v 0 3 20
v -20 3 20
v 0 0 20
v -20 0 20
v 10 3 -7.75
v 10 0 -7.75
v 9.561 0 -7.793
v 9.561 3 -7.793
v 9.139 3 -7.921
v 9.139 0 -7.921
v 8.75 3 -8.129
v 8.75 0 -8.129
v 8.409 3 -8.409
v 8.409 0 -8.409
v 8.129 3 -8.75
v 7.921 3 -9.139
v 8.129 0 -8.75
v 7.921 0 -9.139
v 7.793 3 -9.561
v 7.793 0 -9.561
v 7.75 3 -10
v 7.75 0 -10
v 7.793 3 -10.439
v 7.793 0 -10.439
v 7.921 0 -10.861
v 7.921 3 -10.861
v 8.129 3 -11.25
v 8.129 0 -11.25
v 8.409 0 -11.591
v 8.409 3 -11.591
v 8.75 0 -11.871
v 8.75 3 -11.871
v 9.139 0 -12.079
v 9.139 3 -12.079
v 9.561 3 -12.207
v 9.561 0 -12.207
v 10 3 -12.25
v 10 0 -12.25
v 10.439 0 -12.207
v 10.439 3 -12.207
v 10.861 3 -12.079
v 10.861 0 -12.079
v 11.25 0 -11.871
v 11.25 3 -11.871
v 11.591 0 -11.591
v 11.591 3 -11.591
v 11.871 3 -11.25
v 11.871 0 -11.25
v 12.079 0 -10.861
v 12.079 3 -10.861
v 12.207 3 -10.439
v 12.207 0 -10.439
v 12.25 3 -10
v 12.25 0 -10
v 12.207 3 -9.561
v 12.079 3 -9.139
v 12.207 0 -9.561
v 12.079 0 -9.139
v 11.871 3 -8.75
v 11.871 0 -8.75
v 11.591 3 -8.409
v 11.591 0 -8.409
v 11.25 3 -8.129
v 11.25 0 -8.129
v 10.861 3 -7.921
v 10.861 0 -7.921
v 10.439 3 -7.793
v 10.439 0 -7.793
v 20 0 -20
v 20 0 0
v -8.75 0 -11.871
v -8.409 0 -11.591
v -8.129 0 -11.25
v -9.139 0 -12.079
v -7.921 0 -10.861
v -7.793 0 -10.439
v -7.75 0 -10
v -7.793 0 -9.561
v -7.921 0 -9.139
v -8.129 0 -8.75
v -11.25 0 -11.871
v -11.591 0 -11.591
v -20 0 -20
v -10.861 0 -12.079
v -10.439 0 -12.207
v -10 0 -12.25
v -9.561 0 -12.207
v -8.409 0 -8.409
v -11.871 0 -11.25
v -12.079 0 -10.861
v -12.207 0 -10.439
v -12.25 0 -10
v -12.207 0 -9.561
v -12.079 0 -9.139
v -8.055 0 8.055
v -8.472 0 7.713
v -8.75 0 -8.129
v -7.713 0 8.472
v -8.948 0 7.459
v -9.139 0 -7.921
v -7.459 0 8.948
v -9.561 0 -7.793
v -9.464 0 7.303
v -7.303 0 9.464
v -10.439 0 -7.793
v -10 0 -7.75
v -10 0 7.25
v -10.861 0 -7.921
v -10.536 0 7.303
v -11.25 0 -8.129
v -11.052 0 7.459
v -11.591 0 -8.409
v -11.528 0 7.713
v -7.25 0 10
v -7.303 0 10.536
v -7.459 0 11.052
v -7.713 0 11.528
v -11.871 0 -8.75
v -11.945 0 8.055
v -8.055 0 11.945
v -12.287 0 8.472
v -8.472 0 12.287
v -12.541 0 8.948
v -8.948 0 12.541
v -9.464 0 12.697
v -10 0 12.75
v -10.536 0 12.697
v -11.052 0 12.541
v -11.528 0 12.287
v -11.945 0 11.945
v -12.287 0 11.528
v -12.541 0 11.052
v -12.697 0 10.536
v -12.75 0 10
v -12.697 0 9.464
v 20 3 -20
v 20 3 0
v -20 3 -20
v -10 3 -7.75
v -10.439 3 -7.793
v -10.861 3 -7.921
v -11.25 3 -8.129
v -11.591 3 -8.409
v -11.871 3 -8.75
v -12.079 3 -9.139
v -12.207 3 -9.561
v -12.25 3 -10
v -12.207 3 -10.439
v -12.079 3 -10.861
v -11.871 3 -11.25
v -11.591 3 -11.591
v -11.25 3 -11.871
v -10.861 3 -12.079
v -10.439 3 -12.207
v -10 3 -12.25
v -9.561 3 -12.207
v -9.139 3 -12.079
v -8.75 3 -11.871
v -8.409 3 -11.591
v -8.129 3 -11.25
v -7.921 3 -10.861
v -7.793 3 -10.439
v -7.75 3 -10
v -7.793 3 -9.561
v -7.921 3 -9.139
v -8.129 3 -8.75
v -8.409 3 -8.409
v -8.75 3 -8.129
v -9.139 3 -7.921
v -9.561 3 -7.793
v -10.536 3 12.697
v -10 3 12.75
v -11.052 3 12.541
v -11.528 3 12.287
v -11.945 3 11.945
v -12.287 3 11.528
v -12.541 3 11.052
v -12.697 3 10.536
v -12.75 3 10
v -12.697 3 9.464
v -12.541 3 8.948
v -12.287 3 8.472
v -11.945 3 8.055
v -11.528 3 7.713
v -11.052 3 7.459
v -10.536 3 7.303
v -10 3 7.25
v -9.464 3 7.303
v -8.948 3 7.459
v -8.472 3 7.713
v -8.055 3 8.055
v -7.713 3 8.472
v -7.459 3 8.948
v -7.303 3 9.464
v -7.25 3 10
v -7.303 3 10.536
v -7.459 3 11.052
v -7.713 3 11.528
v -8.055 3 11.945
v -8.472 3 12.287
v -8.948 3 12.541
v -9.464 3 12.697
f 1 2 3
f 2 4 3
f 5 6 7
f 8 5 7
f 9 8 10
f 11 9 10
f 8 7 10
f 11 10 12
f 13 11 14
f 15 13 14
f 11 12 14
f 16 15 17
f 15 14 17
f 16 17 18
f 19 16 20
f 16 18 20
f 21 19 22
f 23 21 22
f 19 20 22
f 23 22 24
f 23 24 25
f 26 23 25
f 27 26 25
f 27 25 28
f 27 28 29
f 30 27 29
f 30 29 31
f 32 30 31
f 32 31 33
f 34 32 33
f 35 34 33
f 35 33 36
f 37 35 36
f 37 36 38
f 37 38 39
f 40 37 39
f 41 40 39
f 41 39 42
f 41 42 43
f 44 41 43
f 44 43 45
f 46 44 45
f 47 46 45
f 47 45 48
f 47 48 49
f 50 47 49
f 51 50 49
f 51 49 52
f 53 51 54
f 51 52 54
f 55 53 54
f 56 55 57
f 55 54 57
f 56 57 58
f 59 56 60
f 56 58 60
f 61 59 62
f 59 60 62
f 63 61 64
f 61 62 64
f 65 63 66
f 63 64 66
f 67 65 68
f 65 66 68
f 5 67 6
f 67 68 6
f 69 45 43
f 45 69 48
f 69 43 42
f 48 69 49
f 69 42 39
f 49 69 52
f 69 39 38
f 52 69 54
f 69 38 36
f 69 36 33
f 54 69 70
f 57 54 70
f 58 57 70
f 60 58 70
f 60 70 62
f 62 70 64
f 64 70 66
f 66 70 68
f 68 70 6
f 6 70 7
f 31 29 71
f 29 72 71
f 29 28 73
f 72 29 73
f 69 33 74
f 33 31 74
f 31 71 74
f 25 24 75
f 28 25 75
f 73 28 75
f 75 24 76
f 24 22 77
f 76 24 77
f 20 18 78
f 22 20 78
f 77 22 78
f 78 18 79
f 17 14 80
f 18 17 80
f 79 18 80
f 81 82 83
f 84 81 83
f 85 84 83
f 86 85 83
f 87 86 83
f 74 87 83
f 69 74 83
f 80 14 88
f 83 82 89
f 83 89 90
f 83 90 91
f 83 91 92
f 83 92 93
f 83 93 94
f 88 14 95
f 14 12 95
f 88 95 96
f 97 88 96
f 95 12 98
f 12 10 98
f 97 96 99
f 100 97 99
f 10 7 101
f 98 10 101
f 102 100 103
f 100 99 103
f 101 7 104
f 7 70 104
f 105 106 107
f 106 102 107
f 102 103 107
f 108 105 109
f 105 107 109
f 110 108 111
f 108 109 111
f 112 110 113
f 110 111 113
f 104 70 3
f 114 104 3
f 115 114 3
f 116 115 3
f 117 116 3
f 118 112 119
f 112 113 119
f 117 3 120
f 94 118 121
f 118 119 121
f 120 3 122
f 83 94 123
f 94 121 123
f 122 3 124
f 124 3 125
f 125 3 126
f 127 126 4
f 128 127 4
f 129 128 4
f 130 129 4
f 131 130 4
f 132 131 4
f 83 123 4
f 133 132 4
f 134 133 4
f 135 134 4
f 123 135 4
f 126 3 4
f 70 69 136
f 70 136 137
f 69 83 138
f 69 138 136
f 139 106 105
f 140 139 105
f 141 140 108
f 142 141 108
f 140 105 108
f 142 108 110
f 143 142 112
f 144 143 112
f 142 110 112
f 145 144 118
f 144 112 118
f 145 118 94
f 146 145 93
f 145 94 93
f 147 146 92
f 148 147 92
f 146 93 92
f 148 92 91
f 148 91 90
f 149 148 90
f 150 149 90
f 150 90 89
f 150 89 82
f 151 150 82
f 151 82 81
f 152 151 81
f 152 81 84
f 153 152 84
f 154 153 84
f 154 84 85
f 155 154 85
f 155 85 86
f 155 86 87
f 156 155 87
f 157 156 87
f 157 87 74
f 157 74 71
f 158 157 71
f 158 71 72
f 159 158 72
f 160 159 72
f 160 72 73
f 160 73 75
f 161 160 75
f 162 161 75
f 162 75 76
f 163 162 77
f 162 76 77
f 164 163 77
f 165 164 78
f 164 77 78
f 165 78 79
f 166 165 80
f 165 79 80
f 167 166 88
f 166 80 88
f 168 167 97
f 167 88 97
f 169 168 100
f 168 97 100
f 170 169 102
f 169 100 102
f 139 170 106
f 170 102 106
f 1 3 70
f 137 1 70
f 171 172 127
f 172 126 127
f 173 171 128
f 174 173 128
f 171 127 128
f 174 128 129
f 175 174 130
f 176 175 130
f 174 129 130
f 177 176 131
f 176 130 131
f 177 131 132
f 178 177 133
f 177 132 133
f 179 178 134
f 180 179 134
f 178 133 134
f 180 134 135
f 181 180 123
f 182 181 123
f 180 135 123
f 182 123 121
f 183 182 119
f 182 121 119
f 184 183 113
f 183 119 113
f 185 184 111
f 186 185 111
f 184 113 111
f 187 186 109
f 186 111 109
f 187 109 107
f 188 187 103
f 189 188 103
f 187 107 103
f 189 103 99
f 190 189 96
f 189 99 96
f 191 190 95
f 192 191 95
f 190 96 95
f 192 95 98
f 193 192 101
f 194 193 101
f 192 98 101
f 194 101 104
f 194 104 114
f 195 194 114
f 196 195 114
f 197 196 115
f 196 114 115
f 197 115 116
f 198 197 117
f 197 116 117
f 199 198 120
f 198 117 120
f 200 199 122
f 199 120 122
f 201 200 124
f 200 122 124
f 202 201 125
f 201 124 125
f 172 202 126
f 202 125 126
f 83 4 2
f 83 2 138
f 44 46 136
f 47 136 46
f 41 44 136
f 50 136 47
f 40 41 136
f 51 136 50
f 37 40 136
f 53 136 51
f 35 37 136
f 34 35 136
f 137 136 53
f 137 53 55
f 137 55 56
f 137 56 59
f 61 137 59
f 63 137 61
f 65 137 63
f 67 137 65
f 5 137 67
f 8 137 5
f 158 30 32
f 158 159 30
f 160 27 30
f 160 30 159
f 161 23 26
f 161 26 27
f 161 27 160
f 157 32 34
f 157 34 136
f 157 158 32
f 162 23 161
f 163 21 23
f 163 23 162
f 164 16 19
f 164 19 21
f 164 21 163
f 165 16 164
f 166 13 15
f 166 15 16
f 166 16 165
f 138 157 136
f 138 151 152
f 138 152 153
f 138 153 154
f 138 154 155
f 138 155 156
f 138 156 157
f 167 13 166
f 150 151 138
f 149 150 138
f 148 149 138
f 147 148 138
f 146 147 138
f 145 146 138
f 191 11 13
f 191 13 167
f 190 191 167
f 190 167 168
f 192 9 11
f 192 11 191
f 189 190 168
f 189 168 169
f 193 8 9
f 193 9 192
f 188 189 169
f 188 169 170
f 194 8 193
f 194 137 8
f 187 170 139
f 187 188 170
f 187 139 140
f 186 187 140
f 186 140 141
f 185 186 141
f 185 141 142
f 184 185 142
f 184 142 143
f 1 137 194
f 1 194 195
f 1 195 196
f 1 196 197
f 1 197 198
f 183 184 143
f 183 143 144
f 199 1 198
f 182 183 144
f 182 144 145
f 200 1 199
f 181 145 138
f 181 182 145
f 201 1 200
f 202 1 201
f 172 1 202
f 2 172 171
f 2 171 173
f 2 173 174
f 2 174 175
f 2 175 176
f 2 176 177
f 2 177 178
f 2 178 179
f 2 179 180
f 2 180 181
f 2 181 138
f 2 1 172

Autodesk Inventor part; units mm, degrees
ref_plane "YZ Plane" through (0, 0, 0) normal (1, 0, 0) x (0, 1, 0)
ref_plane "XZ Plane" through (0, 0, 0) normal (0, 1, 0) x (-1, 0, 0)
ref_plane "XY Plane" through (0, 0, 0) normal (0, 0, 1) x (1, 0, 0)
sketch "Sketch1" plane through (0, 0, 0) normal (0, 1, 0) x (-1, 0, 0)
  line L0 (20, 20) -> (20, -20)
  line L1 (20, -20) -> (-20, -20)
  line L2 (-20, -20) -> (-20, 0)
  line L3 (20, 20) -> (0, 20)
  line L4 (0, 20) -> (-20, 0)
  point P0 (0, 0)
  point P1 (0, -20)
  point P2 (20, 0)
  dimension "d0" = 40
  dimension "d1" = 40
  dimension "d2" = 20
  dimension "d3" = 20
extrude "Extrusion1" add sketch "Sketch1" along normal blind 3
sketch "Sketch2" plane through (0, 3, 0) normal (0, 1, 0) x (1, 0, 0)
  line L0 (-20, 20) -> (-20, -20) projected
  line L1 (20, 0) -> (20, 20) projected
  line L2 (20, 20) -> (-20, 20) projected
  point P0 (0, 0)
  point P1 (-10, 10)
  point P2 (10, 10)
  dimension "d6" = 10
  dimension "d7" = 10
  dimension "d8" = 10
hole "Hole1" at (-10, 3, -10) at (10, 3, -10) direction (0, -1, 0) diameter 4.5 end through all
sketch "Sketch3" plane through (0, 3, 0) normal (0, 1, 0) x (1, 0, 0)
  line L0 (-20, -20) -> (0, -20) projected
  line L1 (-20, 20) -> (-20, -20) projected
  point P0 (0, 0)
  point P1 (-10, -10)
  dimension "d16" = 10
  dimension "d17" = 10
hole "Hole2" at (-10, 3, 10) direction (0, -1, 0) diameter 5.5 end through all
equation "\"d1\" = d0"
properties part number "X-Axis End - Corner"
